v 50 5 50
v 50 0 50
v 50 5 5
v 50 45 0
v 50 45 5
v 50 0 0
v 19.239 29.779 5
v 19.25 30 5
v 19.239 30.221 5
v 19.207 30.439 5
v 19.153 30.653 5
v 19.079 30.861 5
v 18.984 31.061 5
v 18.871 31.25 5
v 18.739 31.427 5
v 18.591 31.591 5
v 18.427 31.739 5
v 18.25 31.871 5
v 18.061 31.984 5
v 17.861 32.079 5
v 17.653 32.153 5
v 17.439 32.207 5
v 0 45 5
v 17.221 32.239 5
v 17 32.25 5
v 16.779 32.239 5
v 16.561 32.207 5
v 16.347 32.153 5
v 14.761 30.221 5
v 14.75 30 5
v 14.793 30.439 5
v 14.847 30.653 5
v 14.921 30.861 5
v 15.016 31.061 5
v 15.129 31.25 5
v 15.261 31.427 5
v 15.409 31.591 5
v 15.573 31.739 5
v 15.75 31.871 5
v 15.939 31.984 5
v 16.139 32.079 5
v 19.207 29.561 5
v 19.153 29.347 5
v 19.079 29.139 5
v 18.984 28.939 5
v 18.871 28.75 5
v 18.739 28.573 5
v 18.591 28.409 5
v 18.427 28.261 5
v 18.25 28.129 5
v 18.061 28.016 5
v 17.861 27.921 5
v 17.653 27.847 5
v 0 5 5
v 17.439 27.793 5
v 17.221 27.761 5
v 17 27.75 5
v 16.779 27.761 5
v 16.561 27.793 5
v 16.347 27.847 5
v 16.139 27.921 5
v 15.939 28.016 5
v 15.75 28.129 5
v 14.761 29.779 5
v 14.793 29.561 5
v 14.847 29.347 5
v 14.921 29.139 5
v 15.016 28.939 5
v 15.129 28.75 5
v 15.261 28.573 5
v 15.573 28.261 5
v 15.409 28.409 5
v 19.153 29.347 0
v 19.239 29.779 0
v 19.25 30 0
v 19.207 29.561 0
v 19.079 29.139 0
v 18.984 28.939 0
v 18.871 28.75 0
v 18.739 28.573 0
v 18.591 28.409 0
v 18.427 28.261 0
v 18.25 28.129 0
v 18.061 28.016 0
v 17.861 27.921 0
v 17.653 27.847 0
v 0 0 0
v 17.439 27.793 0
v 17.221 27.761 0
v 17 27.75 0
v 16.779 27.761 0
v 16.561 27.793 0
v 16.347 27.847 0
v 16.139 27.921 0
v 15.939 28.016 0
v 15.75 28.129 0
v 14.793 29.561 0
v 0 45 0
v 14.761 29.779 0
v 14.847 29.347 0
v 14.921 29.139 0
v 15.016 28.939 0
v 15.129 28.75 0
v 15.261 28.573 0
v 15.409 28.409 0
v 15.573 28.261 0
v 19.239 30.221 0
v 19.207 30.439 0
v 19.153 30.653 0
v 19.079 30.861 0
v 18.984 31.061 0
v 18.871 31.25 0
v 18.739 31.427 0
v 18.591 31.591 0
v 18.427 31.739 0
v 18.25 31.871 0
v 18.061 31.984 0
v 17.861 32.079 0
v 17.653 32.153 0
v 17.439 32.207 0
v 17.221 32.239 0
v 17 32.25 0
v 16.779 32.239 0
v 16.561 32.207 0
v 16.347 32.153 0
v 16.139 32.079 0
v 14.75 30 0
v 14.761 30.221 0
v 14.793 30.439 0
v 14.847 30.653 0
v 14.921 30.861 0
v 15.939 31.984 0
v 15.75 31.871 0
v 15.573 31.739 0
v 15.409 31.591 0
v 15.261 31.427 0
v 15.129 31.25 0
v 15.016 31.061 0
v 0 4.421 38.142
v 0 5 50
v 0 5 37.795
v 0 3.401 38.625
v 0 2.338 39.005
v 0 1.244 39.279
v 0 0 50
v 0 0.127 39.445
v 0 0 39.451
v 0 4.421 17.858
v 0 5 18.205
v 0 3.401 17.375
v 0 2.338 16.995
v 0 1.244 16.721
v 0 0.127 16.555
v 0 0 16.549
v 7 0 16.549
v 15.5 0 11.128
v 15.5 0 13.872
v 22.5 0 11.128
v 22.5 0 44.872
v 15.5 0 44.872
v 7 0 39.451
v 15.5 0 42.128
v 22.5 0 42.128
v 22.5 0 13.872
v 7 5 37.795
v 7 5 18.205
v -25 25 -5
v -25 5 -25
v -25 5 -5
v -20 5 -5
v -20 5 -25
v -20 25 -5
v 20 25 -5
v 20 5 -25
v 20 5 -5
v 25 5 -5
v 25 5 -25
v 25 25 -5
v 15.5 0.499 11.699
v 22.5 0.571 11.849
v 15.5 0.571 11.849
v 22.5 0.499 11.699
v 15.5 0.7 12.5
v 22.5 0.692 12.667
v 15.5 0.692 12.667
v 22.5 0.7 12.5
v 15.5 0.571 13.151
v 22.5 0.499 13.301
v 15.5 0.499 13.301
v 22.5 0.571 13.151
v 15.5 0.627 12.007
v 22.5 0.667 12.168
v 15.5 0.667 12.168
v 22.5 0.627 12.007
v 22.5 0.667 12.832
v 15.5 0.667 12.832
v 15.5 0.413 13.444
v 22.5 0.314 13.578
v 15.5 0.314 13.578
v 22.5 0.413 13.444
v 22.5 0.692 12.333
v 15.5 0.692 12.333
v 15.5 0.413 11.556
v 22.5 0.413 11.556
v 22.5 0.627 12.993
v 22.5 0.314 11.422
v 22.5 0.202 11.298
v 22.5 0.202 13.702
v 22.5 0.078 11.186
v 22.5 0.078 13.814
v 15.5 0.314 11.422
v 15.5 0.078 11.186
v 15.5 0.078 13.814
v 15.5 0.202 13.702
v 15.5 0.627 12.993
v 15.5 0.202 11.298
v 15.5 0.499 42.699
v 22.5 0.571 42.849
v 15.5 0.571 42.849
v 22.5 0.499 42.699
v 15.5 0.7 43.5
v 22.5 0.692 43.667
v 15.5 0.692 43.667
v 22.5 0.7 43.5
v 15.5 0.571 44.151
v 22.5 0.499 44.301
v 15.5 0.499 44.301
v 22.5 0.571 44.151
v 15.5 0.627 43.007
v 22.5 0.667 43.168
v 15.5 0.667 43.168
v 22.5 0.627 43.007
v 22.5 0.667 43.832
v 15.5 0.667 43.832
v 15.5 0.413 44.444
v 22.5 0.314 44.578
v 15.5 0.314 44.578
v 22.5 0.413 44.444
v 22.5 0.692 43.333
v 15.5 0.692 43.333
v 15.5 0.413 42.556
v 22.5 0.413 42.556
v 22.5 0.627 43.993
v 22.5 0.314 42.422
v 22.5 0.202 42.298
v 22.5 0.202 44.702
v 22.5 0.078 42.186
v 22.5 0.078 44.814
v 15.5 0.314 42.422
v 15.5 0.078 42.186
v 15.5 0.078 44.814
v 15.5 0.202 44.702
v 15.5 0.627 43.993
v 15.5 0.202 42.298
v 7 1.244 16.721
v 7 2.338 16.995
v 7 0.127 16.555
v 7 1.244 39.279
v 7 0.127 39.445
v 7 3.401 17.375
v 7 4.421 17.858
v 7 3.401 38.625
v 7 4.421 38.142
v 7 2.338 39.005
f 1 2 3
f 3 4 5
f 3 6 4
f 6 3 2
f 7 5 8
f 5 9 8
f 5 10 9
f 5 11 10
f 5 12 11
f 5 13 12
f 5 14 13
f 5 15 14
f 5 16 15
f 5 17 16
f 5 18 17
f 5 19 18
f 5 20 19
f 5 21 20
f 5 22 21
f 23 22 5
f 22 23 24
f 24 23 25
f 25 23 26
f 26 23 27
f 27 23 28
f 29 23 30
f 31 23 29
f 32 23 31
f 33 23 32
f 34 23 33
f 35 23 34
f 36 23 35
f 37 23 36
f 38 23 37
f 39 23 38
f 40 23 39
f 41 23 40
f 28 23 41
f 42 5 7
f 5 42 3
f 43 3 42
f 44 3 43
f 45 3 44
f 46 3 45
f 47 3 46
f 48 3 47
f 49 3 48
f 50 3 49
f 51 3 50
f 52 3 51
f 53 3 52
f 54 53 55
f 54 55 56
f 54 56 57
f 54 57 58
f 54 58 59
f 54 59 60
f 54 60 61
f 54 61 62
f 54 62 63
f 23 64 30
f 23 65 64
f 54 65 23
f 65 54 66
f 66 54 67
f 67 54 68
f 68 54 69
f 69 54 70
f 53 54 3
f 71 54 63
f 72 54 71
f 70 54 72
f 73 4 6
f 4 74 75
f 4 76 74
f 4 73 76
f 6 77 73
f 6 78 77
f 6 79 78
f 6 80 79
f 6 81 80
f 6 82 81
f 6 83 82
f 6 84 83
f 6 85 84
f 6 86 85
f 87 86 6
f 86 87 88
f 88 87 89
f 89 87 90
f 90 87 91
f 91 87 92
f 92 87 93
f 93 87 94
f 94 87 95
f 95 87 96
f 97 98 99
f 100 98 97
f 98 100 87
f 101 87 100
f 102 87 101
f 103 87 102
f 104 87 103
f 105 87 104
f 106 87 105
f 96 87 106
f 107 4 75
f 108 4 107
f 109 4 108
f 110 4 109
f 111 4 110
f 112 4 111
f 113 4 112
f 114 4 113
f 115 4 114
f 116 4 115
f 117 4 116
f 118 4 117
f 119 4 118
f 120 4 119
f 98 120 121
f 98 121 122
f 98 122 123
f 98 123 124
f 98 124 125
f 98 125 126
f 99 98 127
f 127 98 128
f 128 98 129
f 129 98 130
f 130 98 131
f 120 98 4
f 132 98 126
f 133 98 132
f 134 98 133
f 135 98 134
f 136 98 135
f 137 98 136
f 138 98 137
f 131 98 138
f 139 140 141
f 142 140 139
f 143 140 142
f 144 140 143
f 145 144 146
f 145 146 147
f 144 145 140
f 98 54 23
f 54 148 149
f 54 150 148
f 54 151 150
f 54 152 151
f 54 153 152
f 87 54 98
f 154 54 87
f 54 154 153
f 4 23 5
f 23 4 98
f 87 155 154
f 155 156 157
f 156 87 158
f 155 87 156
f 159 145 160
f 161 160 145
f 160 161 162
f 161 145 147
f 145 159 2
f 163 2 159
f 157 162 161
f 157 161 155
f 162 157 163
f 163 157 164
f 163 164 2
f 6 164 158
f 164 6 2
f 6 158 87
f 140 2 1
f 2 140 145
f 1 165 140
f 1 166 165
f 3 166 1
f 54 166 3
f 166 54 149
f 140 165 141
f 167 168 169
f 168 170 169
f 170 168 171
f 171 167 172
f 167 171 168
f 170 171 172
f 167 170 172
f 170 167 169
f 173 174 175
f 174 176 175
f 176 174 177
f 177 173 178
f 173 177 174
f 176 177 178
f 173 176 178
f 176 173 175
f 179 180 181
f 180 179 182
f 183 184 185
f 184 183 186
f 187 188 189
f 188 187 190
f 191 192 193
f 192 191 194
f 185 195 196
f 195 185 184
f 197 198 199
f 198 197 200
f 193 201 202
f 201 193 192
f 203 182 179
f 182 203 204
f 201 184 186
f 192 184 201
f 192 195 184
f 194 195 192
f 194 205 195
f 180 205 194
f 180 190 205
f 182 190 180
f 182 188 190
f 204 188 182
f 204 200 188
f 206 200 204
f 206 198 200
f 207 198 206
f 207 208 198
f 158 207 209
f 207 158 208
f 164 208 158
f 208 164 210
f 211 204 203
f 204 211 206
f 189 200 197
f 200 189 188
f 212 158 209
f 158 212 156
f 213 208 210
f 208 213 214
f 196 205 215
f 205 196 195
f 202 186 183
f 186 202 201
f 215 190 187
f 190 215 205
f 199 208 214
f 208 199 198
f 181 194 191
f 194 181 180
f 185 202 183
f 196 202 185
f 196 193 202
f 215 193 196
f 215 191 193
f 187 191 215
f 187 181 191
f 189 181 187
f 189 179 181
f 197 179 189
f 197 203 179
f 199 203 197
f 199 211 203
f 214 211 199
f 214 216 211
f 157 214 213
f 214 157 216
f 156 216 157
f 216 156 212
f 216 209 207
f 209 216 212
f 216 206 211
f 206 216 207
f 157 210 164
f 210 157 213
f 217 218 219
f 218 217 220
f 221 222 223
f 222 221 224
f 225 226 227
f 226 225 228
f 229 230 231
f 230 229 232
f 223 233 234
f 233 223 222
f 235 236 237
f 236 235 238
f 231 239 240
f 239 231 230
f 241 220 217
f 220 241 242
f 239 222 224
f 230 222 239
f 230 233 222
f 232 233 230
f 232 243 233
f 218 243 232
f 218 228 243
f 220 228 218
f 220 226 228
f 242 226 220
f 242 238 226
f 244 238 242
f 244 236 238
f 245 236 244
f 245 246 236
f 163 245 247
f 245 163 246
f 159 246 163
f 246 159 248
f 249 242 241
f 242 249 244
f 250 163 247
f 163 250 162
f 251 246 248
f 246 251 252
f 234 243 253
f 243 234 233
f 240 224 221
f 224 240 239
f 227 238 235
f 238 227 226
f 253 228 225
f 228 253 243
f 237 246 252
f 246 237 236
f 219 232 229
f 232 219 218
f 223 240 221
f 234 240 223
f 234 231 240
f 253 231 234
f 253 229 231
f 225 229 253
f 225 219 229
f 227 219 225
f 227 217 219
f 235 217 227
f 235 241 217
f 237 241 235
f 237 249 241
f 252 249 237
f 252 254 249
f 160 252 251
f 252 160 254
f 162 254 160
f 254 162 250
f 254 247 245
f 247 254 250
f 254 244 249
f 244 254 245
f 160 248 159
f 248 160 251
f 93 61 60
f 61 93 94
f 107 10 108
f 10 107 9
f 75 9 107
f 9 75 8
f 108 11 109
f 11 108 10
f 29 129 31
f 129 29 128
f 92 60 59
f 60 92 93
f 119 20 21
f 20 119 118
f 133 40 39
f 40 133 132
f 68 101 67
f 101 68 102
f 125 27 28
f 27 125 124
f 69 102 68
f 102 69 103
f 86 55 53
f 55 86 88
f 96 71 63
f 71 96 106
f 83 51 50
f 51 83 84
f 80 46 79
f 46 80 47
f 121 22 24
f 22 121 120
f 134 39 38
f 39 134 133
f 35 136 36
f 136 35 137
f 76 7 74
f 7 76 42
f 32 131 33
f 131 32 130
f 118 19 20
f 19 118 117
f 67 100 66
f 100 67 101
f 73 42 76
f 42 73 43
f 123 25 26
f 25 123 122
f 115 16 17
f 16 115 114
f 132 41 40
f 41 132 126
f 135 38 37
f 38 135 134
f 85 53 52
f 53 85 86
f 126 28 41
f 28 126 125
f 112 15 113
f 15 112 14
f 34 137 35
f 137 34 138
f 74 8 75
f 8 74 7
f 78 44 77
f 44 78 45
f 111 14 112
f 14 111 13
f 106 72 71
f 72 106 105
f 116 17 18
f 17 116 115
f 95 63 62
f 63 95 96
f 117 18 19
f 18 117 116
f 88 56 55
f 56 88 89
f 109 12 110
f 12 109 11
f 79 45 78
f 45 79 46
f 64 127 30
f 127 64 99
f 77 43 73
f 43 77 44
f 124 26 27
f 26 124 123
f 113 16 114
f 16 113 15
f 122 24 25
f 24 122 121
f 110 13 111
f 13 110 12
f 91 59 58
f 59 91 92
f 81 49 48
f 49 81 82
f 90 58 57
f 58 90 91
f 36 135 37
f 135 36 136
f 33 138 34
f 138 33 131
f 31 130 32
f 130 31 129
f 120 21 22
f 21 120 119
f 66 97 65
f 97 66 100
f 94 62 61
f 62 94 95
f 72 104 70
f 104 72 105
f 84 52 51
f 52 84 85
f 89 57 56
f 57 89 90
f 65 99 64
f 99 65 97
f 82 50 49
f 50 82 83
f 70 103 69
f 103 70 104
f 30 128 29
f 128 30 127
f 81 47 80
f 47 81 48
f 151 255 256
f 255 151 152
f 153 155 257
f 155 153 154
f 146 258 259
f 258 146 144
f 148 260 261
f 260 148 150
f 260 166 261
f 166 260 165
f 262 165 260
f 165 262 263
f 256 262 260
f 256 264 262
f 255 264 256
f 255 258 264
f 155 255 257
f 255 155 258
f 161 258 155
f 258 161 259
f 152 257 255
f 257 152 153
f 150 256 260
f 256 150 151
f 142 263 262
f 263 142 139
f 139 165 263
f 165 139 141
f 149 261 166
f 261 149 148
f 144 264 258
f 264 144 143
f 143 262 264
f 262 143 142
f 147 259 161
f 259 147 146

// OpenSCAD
// L-shaped NEMA 17 Stepper Motor Mounting Bracket
// Designed for a syringe pump application.

// --- Dimensions ---
// Base Plate
base_x_min = -25;
base_x_max = 25;
base_y_min = 0;
base_y_max = 45;
base_z_min = 0;
base_z_max = 5;

// Base Plate Holes (M4)
m4_hole_d = 4.5;
m4_hole_x1 = -17;
m4_hole_x2 = 17;
m4_hole_y = 30;

// Vertical Motor Plate
vert_x_min = -25;
vert_x_max = 25;
vert_y_min = 0;
vert_y_max = 5;
vert_z_min = 0;
vert_z_max = 50;

// Motor Boss Hole (Centering)
boss_d = 23;
boss_x = 0;
boss_z = 28;

// M3 Screw Holes (Motor Plate)
m3_hole_d = 3.4;
m3_pattern_size = 31;

// Gussets
gusset_thick = 5;
gusset_leg_y = 20;
gusset_leg_z = 20;

$fn = 64;

// --- Helper Modules ---

module gusset_shape() {
    // Right triangle in YZ plane
    // Corner at y=5, z=5. Legs are 20mm.
    // Vertices in YZ: (5,5), (5+20, 5), (5, 5+20)
    polygon(points = [[5, 5], [5 + gusset_leg_y, 5], [5, 5 + gusset_leg_z]]);
}

// --- Main Assembly ---

difference() {
    // --- Positive Geometry ---
    union() {
        // Base Plate
        translate([0, 0, 0])
            cube([base_x_max - base_x_min, base_y_max - base_y_min, base_z_max]);
        
        // Vertical Motor Plate
        translate([0, 0, 0])
            cube([base_x_max - base_x_min, vert_y_max - vert_y_min, vert_z_max]);
            
        // Gussets (Left and Right)
        // Left Gusset
        translate([base_x_min, 0, 0])
            rotate([0, 90, 0]) // Rotate to stand in YZ plane
            linear_extrude(height = gusset_thick)
            gusset_shape();
            
        // Right Gusset
        translate([base_x_max - gusset_thick, 0, 0])
            rotate([0, 90, 0])
            linear_extrude(height = gusset_thick)
            gusset_shape();
    }

    // --- Negative Geometry (Cuts) ---
    
    // M4 Holes in Base Plate
    translate([m4_hole_x1, m4_hole_y, -1])
        cylinder(h = base_z_max + 2, d = m4_hole_d);
    translate([m4_hole_x2, m4_hole_y, -1])
        cylinder(h = base_z_max + 2, d = m4_hole_d);

    // Motor Boss Hole (through the vertical plate along Y)
    // The plate is at y=0 to 5. The hole is 23mm diameter.
    // Since the plate is only 5mm thick, we cut through the Y axis.
    translate([boss_x, -1, boss_z])
        rotate([0, 90, 0])
        cylinder(h = vert_y_max + 2, d = boss_d);

    // M3 Screw Holes in Vertical Plate
    // Pattern is 31mm square, centered on boss (0, 28)
    // Coordinates relative to center: +/- 15.5
    for (sx = [-1, 1], sz = [-1, 1]) {
        translate([sx * (m3_pattern_size / 2), -1, boss_z + sz * (m3_pattern_size / 2)])
            rotate([0, 90, 0])
            cylinder(h = vert_y_max + 2, d = m3_hole_d);
    }
}

// Note: The base plate is centered on X by the user's request of -25 to 25.
// In OpenSCAD, cube([50, 45, 5]) starts at 0,0,0. 
// To match the user's coordinate system exactly:
// We use translate to ensure the base plate is at x = -25 to 25.
// However, the code above uses absolute coordinates for simplicity.
// Let's adjust the base plate translation to match the user's coordinate request.
// User: Base plate x from -25 to 25, y from 0 to 45.
// My code: cube([50, 45, 5]) at [0,0,0] results in x: 0 to 50.
// Corrected logic:
// I will rewrite the main block to use the user's exact coordinate system.
